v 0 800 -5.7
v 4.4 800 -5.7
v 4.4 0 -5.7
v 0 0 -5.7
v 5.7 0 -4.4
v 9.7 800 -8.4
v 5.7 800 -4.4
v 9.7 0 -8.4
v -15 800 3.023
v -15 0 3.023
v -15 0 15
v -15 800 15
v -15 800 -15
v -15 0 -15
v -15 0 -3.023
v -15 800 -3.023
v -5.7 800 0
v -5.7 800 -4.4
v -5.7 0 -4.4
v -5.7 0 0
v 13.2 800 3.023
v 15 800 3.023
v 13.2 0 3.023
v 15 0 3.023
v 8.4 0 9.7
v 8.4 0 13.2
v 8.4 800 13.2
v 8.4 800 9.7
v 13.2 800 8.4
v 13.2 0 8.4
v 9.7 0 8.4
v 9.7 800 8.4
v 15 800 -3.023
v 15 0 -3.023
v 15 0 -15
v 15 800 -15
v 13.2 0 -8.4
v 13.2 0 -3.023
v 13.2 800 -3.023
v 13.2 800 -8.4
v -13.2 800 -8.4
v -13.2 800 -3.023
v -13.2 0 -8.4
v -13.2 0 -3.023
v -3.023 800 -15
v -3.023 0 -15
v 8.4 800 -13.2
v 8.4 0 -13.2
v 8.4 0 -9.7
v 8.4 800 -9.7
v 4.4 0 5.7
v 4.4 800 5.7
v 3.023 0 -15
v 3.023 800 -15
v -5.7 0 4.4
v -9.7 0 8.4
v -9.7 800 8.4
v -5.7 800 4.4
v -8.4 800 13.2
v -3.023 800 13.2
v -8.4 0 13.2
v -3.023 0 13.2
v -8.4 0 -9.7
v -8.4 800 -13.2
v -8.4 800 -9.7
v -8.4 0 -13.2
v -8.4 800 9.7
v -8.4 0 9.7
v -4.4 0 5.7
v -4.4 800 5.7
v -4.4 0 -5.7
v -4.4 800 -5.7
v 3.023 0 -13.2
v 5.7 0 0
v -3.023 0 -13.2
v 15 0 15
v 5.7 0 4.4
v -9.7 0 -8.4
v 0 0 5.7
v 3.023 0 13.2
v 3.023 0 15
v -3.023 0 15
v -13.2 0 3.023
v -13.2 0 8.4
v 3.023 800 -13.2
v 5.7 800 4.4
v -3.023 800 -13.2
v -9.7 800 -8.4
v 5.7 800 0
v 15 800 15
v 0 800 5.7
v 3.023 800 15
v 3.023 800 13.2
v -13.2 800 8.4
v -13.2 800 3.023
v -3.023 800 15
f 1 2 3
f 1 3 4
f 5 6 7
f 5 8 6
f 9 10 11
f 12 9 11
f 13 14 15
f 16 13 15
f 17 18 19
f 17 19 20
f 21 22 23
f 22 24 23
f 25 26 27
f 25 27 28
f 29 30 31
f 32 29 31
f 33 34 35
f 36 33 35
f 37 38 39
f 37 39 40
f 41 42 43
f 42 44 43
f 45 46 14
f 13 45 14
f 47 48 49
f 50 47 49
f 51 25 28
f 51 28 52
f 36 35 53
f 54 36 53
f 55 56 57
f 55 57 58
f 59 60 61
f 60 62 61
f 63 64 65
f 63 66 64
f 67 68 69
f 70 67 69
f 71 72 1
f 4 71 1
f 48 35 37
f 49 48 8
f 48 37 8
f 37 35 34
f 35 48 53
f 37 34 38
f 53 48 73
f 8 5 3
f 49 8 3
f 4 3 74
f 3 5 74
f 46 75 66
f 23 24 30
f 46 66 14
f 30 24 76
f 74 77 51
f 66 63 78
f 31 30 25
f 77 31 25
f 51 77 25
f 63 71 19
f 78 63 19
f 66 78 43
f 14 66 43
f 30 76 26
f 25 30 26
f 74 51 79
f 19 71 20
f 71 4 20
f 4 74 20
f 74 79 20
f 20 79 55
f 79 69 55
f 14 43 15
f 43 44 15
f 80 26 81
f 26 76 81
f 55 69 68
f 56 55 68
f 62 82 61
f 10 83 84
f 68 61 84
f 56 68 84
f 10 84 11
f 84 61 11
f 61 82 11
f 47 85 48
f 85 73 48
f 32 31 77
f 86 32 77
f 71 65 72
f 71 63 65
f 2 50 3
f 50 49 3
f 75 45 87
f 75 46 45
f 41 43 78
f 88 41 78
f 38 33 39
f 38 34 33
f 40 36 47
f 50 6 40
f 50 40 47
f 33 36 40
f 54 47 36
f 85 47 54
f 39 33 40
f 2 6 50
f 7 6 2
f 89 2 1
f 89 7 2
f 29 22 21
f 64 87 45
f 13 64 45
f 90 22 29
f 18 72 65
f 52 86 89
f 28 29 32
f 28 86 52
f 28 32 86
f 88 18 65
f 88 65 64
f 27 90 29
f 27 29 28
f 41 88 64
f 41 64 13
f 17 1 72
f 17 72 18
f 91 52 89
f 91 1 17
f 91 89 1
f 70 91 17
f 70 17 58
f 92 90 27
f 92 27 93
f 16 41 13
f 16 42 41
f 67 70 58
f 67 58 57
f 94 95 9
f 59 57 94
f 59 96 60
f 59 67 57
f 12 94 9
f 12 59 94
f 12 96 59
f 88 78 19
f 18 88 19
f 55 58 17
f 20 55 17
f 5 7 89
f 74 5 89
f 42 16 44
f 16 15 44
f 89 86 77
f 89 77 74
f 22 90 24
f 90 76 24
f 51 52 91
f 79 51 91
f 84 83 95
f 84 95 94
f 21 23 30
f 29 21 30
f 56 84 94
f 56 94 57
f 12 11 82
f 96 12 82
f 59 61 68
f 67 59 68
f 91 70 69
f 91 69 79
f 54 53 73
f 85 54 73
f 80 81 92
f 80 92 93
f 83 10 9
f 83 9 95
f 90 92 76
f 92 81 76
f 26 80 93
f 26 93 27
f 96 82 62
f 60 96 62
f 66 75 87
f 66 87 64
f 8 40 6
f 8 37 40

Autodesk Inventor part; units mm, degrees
ref_plane "YZ Plane" through (0, 0, 0) normal (1, 0, 0) x (0, 1, 0)
ref_plane "XZ Plane" through (0, 0, 0) normal (0, 1, 0) x (-1, 0, 0)
ref_plane "XY Plane" through (0, 0, 0) normal (0, 0, 1) x (1, 0, 0)
sketch "草图1" plane through (0, 0, 0) normal (0, 1, 0) x (-1, 0, 0)
  line L0 (15, 3.0233) -> (15, 15)
  line L1 (15, 15) -> (3.0233, 15)
  line L2 (3.0233, 15) -> (3.0233, 13.2)
  line L3 (3.0233, 13.2) -> (8.4, 13.2)
  line L4 (8.4, 13.2) -> (8.4, 9.7)
  line L5 (8.4, 9.7) -> (4.4, 5.7)
  line L6 (4.4, 5.7) -> (0, 5.7)
  line L7 (15, 3.0233) -> (13.2, 3.0233)
  line L8 (13.2, 3.0233) -> (13.2, 8.4)
  line L9 (13.2, 8.4) -> (9.7, 8.4)
  line L10 (9.7, 8.4) -> (5.7, 4.4)
  line L11 (5.7, 4.4) -> (5.7, 0)
  line L12 (-15, 3.0233) -> (-13.2, 3.0233)
  line L13 (-5.7, 4.4) -> (-5.7, 0)
  line L14 (-13.2, 3.0233) -> (-13.2, 8.4)
  line L15 (-13.2, 8.4) -> (-9.7, 8.4)
  line L16 (-9.7, 8.4) -> (-5.7, 4.4)
  line L17 (-8.4, 9.7) -> (-4.4, 5.7)
  line L18 (-4.4, 5.7) -> (0, 5.7)
  line L19 (-15, 15) -> (-15, 3.0233)
  line L20 (-8.4, 13.2) -> (-8.4, 9.7)
  line L21 (-3.0233, 15) -> (-15, 15)
  line L22 (-3.0233, 13.2) -> (-8.4, 13.2)
  line L23 (-3.0233, 15) -> (-3.0233, 13.2)
  line L24 (-3.0233, -15) -> (-3.0233, -13.2)
  line L25 (-4.4, -5.7) -> (0, -5.7)
  line L26 (-3.0233, -13.2) -> (-8.4, -13.2)
  line L27 (-8.4, -13.2) -> (-8.4, -9.7)
  line L28 (-8.4, -9.7) -> (-4.4, -5.7)
  line L29 (-9.7, -8.4) -> (-5.7, -4.4)
  line L30 (-5.7, -4.4) -> (-5.7, 0)
  line L31 (-15, -15) -> (-3.0233, -15)
  line L32 (-13.2, -8.4) -> (-9.7, -8.4)
  line L33 (-15, -3.0233) -> (-15, -15)
  line L34 (-13.2, -3.0233) -> (-13.2, -8.4)
  line L35 (-15, -3.0233) -> (-13.2, -3.0233)
  line L36 (15, -3.0233) -> (13.2, -3.0233)
  line L37 (5.7, -4.4) -> (5.7, 0)
  line L38 (13.2, -3.0233) -> (13.2, -8.4)
  line L39 (13.2, -8.4) -> (9.7, -8.4)
  line L40 (9.7, -8.4) -> (5.7, -4.4)
  line L41 (8.4, -9.7) -> (4.4, -5.7)
  line L42 (4.4, -5.7) -> (0, -5.7)
  line L43 (15, -15) -> (15, -3.0233)
  line L44 (8.4, -13.2) -> (8.4, -9.7)
  line L45 (3.0233, -15) -> (15, -15)
  line L46 (3.0233, -13.2) -> (8.4, -13.2)
  line L47 (3.0233, -15) -> (3.0233, -13.2)
  point P0 (0, 0)
  point P1 (15, 0)
  point P2 (0, 0)
  point P3 (0, 0)
  point P4 (0, 0)
  point P5 (0, 0)
  point P6 (0, 0)
  point P7 (0, 15)
  point P8 (0, 0)
  point P9 (0, 0)
  point P10 (0, 0)
  point P11 (-15, 0)
  point P12 (0, 0)
  point P13 (0, 0)
  point P14 (0, 0)
  point P15 (0, -15)
  point P16 (-5.7, 0)
  point P17 (0, -5.7)
  point P18 (5.7, 0)
  dimension "d8" = 5.7
  dimension "d9" = 1.8
  dimension "d10" = 8.4
  dimension "d11" = 4
  dimension "d14" = 360
extrude "拉伸1" add sketch "草图1" along normal blind 800
properties part number "3030型材"
